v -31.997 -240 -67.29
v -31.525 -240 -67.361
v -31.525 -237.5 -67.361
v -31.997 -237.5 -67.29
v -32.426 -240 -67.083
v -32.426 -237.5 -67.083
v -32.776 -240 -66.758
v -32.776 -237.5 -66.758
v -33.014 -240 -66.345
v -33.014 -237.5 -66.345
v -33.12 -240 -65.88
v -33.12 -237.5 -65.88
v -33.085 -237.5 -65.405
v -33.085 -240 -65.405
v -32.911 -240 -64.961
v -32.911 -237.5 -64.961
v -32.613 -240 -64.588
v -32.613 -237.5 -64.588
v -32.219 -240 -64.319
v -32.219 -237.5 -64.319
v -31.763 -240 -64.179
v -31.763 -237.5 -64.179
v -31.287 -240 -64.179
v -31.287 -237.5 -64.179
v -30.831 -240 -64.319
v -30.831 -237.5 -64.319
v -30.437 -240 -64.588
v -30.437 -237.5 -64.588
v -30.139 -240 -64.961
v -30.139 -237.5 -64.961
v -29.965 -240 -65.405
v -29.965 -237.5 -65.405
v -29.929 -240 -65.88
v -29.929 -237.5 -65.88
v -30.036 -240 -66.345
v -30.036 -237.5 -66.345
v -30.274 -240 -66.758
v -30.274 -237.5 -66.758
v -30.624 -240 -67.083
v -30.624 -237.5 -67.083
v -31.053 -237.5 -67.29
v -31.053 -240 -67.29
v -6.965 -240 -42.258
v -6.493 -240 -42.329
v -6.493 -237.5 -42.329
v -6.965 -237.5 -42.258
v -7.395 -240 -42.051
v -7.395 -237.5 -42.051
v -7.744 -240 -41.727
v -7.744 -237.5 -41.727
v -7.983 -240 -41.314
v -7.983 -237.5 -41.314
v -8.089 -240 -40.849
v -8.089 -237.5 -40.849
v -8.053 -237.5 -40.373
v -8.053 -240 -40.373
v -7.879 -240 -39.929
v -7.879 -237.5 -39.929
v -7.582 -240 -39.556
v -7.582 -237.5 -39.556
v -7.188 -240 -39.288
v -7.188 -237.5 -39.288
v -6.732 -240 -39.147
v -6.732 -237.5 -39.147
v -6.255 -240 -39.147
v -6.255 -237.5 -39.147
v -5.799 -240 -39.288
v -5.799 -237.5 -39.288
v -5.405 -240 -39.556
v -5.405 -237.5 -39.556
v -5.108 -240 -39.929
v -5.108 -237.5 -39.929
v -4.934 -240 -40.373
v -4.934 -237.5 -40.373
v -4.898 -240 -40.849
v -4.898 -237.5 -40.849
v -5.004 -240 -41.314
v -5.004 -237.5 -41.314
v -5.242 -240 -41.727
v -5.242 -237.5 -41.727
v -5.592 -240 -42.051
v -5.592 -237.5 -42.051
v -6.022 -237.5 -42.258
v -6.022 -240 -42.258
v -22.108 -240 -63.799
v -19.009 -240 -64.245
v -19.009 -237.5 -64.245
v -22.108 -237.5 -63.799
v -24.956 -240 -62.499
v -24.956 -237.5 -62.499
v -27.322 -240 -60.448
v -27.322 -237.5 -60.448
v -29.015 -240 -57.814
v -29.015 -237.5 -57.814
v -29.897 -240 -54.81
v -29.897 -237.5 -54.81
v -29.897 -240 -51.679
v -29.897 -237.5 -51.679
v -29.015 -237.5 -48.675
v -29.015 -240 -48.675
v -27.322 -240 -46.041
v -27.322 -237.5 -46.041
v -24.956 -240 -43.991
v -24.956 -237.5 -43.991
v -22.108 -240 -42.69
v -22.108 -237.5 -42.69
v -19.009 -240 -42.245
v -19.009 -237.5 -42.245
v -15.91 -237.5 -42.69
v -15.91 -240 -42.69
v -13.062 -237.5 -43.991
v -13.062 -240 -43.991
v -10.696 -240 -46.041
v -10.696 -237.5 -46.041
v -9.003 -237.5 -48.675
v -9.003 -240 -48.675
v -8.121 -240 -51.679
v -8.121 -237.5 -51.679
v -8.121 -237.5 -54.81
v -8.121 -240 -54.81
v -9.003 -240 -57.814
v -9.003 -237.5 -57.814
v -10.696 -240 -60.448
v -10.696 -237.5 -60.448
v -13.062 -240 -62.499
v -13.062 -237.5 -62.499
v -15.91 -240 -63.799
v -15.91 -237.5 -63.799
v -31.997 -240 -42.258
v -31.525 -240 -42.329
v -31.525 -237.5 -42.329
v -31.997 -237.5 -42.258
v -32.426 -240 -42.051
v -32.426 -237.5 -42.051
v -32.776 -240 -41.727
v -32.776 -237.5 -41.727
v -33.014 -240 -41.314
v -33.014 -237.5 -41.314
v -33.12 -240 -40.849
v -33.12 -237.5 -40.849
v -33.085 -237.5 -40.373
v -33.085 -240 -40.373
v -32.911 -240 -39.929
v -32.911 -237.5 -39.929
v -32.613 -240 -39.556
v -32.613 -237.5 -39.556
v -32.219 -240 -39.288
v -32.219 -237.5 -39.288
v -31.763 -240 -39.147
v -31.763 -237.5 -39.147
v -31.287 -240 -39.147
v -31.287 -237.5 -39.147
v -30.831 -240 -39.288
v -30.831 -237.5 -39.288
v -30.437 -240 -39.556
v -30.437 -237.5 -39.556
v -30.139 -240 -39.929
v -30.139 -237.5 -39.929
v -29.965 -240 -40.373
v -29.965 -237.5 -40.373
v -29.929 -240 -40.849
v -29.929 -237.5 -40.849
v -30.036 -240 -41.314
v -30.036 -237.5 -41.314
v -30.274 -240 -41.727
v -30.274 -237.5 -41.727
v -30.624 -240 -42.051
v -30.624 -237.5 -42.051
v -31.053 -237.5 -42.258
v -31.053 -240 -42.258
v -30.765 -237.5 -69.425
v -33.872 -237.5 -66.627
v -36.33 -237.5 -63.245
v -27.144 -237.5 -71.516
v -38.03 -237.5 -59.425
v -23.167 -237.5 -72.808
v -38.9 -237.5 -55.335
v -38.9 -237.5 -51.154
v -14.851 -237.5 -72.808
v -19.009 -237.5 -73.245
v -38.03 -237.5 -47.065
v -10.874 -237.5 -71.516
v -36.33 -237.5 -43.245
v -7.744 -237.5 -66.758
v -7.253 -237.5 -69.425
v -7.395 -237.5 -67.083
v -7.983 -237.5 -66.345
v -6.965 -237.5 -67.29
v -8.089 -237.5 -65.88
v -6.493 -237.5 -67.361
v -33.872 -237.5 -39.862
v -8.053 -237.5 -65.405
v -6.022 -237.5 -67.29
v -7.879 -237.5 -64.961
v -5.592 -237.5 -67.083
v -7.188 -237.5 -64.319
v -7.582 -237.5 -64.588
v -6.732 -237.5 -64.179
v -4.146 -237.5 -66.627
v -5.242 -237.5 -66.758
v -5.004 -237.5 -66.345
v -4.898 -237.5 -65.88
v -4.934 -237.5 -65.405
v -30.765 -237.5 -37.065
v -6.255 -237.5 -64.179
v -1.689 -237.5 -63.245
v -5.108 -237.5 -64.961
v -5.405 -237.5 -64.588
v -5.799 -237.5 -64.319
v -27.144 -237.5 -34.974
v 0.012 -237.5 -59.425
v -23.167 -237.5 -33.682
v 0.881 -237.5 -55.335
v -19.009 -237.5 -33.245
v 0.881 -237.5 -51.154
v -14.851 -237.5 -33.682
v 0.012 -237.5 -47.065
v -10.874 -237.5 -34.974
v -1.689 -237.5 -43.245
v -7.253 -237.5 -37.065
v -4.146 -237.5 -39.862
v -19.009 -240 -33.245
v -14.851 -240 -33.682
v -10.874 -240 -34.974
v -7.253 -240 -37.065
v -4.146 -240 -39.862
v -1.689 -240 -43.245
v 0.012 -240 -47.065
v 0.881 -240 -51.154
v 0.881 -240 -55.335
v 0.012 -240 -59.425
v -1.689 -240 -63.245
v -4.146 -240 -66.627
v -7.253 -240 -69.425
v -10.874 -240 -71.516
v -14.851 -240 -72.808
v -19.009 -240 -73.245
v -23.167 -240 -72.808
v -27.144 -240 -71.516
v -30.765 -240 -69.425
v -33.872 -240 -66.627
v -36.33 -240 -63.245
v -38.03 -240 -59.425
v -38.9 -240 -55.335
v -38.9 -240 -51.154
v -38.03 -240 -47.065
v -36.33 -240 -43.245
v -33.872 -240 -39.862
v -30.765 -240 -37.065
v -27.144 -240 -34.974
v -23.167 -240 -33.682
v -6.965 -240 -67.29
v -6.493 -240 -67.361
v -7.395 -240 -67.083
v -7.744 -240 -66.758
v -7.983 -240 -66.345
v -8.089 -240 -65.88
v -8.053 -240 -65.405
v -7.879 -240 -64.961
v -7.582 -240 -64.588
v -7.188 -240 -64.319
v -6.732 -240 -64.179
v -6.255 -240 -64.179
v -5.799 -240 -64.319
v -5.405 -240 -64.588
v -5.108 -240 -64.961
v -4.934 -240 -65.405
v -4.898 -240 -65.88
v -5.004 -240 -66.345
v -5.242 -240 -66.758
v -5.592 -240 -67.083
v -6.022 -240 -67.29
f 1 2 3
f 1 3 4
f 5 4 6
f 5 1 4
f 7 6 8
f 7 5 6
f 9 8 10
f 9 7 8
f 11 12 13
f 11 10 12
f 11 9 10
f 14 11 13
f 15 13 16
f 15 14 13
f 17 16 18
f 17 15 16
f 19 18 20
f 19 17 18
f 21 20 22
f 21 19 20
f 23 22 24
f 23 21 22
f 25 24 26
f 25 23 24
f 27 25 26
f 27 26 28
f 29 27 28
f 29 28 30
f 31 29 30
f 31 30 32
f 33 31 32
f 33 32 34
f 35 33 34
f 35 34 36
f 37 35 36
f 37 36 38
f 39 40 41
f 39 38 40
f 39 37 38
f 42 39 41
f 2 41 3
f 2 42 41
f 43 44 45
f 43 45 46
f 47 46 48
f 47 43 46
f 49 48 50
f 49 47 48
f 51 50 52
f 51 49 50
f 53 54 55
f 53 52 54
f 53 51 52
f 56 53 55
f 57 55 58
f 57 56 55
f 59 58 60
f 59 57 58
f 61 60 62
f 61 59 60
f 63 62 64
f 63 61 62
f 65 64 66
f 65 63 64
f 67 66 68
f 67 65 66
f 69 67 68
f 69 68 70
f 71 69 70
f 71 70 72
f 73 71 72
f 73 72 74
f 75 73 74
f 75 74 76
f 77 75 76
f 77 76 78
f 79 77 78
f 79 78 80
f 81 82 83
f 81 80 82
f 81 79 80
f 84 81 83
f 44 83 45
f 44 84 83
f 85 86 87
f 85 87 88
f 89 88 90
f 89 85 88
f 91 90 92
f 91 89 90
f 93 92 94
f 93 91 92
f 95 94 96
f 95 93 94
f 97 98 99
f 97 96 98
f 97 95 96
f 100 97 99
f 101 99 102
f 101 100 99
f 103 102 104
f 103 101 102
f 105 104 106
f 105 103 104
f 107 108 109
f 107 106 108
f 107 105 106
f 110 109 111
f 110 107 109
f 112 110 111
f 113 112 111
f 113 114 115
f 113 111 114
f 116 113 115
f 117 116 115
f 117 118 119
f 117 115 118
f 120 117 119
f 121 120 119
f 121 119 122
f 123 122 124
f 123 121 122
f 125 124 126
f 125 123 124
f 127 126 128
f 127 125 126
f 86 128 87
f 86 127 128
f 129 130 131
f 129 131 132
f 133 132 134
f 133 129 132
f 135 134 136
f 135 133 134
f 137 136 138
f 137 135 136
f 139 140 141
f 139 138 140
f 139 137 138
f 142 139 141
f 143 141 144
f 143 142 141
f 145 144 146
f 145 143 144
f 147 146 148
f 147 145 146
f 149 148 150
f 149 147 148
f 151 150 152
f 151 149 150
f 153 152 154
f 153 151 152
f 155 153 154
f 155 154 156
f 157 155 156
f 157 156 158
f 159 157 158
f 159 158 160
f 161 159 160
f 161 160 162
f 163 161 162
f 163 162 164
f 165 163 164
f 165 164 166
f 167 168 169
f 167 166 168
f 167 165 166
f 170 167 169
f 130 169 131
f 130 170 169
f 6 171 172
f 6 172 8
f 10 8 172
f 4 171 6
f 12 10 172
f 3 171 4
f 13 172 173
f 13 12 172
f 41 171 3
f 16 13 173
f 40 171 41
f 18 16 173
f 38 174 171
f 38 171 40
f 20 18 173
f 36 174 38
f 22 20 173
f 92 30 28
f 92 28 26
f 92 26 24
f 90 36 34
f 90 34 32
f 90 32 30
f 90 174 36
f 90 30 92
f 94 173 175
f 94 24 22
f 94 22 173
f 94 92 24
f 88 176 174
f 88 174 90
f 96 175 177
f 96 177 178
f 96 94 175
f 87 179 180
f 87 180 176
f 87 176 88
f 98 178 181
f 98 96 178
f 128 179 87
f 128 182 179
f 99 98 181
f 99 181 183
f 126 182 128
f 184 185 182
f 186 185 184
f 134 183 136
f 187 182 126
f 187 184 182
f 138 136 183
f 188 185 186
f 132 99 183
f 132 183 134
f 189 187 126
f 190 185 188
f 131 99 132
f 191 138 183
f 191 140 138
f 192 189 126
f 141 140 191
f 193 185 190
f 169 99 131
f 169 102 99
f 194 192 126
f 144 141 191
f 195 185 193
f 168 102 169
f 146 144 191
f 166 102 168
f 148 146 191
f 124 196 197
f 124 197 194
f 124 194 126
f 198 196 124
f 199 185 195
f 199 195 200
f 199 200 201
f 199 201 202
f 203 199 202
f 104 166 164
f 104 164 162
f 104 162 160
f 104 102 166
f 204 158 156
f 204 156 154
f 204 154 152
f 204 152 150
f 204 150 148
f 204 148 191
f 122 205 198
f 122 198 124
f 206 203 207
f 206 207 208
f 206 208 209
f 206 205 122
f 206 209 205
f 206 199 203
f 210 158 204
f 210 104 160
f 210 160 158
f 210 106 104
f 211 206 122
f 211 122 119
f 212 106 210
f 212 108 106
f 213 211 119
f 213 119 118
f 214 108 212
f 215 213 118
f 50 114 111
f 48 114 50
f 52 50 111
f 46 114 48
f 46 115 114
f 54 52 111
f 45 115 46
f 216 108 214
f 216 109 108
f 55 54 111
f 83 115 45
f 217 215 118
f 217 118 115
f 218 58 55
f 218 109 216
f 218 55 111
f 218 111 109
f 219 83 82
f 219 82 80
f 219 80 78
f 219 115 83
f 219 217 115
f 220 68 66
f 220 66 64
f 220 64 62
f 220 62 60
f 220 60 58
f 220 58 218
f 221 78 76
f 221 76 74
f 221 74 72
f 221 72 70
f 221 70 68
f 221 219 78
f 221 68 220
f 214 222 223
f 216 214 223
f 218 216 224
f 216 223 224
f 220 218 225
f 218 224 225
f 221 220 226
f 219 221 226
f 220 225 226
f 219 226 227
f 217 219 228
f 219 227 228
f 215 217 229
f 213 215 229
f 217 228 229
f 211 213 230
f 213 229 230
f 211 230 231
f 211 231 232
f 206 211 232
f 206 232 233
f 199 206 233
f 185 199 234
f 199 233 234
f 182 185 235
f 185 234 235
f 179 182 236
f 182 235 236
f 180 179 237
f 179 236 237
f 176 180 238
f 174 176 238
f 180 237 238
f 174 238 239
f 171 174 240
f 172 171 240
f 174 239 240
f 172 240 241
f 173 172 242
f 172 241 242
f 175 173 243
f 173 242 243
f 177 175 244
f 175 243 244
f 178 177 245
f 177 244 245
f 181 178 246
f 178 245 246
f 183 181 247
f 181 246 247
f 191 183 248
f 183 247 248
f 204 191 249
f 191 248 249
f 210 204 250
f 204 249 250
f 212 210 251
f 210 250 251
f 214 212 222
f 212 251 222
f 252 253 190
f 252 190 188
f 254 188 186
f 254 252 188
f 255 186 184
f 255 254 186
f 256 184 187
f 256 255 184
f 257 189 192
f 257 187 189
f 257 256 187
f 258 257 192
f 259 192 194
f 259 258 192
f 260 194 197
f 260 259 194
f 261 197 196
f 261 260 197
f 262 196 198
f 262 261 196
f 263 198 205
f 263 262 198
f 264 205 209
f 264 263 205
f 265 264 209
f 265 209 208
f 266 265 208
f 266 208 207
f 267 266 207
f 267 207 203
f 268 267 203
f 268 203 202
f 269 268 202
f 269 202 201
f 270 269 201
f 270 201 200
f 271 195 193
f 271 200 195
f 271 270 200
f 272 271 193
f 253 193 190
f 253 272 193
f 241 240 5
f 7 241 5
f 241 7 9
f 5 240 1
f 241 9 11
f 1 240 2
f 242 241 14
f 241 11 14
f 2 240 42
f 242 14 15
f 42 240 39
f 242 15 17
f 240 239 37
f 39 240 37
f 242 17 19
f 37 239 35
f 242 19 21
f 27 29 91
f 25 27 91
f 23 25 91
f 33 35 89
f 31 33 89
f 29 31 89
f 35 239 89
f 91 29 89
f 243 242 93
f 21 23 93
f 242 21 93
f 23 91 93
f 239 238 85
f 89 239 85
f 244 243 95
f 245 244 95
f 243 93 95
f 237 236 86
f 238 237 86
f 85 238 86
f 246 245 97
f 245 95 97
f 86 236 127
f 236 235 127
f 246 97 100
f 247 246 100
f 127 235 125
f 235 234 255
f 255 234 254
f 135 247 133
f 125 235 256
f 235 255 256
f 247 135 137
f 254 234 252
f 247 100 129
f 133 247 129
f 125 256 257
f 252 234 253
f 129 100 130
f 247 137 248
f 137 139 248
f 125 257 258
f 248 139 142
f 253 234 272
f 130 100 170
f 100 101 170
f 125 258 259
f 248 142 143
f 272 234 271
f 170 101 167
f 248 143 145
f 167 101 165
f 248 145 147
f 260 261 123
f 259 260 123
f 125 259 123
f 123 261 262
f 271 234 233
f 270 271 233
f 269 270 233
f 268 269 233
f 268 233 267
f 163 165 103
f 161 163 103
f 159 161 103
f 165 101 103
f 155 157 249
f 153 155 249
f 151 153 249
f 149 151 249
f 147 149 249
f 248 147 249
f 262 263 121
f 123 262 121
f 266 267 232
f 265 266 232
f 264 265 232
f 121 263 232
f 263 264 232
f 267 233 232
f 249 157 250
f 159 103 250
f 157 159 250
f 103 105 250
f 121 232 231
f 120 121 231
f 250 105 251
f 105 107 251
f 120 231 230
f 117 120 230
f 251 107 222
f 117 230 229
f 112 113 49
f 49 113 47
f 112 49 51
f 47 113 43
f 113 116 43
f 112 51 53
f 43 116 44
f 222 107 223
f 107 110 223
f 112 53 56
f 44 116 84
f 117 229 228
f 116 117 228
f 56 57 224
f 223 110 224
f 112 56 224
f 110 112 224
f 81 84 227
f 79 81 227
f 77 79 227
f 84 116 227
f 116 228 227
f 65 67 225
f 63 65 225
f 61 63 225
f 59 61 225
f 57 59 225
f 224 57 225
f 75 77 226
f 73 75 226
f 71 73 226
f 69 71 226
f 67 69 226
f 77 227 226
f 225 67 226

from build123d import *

# Parameters (mm, degrees)
CAP_DISC_SKETCH_R                   = 20
CAP_DISC_DEPTH                      = 2.5
SHAFT_AND_SPACER_CLEARANCE_SKETCH_R = 11
SHAFT_AND_SPACER_CLEARANCE_DEPTH    = 2.7
M3_CAP_CLEARANCE_PATTERN_SKETCH_R   = 1.6
M3_CAP_CLEARANCE_PATTERN_DEPTH      = 2.7


with BuildPart() as part:
    # Cap disc sketch → Cap disc (new body)
    with BuildSketch(Plane(origin=(0, -240, 0), x_dir=(1, 0, 0), z_dir=(0, 1, 0))):
        with Locations(Location((-19.009182883, 53.244882879, 0), (0, 0, 270))):
            Circle(CAP_DISC_SKETCH_R)
    extrude(amount=CAP_DISC_DEPTH)

    # Shaft and spacer clearance sketch → Shaft and spacer clearance (cut)
    with BuildSketch(Plane(origin=(0, -240.1, 0), x_dir=(1, 0, 0), z_dir=(0, 1, 0))):
        with Locations(Location((-19.009182883, 53.244882879, 0), (0, 0, 90))):
            Circle(SHAFT_AND_SPACER_CLEARANCE_SKETCH_R)
    extrude(amount=SHAFT_AND_SPACER_CLEARANCE_DEPTH, mode=Mode.SUBTRACT)

    # M3 cap clearance pattern sketch → M3 cap clearance pattern (cut)
    with BuildSketch(Plane(origin=(0, -240.1, 0), x_dir=(1, 0, 0), z_dir=(0, 1, 0))):
        with Locations(Location((-6.493392856, 40.729092852, 0), (0, 0, 90))):
            Circle(M3_CAP_CLEARANCE_PATTERN_SKETCH_R)
        with Locations(Location((-31.52497291, 40.729092852, 0), (0, 0, 90))):
            Circle(M3_CAP_CLEARANCE_PATTERN_SKETCH_R)
        with Locations(Location((-31.52497291, 65.760672906, 0), (0, 0, 90))):
            Circle(M3_CAP_CLEARANCE_PATTERN_SKETCH_R)
        with Locations(Location((-6.493392856, 65.760672906, 0), (0, 0, 90))):
            Circle(M3_CAP_CLEARANCE_PATTERN_SKETCH_R)
    extrude(amount=M3_CAP_CLEARANCE_PATTERN_DEPTH, mode=Mode.SUBTRACT)


solid = part.part
